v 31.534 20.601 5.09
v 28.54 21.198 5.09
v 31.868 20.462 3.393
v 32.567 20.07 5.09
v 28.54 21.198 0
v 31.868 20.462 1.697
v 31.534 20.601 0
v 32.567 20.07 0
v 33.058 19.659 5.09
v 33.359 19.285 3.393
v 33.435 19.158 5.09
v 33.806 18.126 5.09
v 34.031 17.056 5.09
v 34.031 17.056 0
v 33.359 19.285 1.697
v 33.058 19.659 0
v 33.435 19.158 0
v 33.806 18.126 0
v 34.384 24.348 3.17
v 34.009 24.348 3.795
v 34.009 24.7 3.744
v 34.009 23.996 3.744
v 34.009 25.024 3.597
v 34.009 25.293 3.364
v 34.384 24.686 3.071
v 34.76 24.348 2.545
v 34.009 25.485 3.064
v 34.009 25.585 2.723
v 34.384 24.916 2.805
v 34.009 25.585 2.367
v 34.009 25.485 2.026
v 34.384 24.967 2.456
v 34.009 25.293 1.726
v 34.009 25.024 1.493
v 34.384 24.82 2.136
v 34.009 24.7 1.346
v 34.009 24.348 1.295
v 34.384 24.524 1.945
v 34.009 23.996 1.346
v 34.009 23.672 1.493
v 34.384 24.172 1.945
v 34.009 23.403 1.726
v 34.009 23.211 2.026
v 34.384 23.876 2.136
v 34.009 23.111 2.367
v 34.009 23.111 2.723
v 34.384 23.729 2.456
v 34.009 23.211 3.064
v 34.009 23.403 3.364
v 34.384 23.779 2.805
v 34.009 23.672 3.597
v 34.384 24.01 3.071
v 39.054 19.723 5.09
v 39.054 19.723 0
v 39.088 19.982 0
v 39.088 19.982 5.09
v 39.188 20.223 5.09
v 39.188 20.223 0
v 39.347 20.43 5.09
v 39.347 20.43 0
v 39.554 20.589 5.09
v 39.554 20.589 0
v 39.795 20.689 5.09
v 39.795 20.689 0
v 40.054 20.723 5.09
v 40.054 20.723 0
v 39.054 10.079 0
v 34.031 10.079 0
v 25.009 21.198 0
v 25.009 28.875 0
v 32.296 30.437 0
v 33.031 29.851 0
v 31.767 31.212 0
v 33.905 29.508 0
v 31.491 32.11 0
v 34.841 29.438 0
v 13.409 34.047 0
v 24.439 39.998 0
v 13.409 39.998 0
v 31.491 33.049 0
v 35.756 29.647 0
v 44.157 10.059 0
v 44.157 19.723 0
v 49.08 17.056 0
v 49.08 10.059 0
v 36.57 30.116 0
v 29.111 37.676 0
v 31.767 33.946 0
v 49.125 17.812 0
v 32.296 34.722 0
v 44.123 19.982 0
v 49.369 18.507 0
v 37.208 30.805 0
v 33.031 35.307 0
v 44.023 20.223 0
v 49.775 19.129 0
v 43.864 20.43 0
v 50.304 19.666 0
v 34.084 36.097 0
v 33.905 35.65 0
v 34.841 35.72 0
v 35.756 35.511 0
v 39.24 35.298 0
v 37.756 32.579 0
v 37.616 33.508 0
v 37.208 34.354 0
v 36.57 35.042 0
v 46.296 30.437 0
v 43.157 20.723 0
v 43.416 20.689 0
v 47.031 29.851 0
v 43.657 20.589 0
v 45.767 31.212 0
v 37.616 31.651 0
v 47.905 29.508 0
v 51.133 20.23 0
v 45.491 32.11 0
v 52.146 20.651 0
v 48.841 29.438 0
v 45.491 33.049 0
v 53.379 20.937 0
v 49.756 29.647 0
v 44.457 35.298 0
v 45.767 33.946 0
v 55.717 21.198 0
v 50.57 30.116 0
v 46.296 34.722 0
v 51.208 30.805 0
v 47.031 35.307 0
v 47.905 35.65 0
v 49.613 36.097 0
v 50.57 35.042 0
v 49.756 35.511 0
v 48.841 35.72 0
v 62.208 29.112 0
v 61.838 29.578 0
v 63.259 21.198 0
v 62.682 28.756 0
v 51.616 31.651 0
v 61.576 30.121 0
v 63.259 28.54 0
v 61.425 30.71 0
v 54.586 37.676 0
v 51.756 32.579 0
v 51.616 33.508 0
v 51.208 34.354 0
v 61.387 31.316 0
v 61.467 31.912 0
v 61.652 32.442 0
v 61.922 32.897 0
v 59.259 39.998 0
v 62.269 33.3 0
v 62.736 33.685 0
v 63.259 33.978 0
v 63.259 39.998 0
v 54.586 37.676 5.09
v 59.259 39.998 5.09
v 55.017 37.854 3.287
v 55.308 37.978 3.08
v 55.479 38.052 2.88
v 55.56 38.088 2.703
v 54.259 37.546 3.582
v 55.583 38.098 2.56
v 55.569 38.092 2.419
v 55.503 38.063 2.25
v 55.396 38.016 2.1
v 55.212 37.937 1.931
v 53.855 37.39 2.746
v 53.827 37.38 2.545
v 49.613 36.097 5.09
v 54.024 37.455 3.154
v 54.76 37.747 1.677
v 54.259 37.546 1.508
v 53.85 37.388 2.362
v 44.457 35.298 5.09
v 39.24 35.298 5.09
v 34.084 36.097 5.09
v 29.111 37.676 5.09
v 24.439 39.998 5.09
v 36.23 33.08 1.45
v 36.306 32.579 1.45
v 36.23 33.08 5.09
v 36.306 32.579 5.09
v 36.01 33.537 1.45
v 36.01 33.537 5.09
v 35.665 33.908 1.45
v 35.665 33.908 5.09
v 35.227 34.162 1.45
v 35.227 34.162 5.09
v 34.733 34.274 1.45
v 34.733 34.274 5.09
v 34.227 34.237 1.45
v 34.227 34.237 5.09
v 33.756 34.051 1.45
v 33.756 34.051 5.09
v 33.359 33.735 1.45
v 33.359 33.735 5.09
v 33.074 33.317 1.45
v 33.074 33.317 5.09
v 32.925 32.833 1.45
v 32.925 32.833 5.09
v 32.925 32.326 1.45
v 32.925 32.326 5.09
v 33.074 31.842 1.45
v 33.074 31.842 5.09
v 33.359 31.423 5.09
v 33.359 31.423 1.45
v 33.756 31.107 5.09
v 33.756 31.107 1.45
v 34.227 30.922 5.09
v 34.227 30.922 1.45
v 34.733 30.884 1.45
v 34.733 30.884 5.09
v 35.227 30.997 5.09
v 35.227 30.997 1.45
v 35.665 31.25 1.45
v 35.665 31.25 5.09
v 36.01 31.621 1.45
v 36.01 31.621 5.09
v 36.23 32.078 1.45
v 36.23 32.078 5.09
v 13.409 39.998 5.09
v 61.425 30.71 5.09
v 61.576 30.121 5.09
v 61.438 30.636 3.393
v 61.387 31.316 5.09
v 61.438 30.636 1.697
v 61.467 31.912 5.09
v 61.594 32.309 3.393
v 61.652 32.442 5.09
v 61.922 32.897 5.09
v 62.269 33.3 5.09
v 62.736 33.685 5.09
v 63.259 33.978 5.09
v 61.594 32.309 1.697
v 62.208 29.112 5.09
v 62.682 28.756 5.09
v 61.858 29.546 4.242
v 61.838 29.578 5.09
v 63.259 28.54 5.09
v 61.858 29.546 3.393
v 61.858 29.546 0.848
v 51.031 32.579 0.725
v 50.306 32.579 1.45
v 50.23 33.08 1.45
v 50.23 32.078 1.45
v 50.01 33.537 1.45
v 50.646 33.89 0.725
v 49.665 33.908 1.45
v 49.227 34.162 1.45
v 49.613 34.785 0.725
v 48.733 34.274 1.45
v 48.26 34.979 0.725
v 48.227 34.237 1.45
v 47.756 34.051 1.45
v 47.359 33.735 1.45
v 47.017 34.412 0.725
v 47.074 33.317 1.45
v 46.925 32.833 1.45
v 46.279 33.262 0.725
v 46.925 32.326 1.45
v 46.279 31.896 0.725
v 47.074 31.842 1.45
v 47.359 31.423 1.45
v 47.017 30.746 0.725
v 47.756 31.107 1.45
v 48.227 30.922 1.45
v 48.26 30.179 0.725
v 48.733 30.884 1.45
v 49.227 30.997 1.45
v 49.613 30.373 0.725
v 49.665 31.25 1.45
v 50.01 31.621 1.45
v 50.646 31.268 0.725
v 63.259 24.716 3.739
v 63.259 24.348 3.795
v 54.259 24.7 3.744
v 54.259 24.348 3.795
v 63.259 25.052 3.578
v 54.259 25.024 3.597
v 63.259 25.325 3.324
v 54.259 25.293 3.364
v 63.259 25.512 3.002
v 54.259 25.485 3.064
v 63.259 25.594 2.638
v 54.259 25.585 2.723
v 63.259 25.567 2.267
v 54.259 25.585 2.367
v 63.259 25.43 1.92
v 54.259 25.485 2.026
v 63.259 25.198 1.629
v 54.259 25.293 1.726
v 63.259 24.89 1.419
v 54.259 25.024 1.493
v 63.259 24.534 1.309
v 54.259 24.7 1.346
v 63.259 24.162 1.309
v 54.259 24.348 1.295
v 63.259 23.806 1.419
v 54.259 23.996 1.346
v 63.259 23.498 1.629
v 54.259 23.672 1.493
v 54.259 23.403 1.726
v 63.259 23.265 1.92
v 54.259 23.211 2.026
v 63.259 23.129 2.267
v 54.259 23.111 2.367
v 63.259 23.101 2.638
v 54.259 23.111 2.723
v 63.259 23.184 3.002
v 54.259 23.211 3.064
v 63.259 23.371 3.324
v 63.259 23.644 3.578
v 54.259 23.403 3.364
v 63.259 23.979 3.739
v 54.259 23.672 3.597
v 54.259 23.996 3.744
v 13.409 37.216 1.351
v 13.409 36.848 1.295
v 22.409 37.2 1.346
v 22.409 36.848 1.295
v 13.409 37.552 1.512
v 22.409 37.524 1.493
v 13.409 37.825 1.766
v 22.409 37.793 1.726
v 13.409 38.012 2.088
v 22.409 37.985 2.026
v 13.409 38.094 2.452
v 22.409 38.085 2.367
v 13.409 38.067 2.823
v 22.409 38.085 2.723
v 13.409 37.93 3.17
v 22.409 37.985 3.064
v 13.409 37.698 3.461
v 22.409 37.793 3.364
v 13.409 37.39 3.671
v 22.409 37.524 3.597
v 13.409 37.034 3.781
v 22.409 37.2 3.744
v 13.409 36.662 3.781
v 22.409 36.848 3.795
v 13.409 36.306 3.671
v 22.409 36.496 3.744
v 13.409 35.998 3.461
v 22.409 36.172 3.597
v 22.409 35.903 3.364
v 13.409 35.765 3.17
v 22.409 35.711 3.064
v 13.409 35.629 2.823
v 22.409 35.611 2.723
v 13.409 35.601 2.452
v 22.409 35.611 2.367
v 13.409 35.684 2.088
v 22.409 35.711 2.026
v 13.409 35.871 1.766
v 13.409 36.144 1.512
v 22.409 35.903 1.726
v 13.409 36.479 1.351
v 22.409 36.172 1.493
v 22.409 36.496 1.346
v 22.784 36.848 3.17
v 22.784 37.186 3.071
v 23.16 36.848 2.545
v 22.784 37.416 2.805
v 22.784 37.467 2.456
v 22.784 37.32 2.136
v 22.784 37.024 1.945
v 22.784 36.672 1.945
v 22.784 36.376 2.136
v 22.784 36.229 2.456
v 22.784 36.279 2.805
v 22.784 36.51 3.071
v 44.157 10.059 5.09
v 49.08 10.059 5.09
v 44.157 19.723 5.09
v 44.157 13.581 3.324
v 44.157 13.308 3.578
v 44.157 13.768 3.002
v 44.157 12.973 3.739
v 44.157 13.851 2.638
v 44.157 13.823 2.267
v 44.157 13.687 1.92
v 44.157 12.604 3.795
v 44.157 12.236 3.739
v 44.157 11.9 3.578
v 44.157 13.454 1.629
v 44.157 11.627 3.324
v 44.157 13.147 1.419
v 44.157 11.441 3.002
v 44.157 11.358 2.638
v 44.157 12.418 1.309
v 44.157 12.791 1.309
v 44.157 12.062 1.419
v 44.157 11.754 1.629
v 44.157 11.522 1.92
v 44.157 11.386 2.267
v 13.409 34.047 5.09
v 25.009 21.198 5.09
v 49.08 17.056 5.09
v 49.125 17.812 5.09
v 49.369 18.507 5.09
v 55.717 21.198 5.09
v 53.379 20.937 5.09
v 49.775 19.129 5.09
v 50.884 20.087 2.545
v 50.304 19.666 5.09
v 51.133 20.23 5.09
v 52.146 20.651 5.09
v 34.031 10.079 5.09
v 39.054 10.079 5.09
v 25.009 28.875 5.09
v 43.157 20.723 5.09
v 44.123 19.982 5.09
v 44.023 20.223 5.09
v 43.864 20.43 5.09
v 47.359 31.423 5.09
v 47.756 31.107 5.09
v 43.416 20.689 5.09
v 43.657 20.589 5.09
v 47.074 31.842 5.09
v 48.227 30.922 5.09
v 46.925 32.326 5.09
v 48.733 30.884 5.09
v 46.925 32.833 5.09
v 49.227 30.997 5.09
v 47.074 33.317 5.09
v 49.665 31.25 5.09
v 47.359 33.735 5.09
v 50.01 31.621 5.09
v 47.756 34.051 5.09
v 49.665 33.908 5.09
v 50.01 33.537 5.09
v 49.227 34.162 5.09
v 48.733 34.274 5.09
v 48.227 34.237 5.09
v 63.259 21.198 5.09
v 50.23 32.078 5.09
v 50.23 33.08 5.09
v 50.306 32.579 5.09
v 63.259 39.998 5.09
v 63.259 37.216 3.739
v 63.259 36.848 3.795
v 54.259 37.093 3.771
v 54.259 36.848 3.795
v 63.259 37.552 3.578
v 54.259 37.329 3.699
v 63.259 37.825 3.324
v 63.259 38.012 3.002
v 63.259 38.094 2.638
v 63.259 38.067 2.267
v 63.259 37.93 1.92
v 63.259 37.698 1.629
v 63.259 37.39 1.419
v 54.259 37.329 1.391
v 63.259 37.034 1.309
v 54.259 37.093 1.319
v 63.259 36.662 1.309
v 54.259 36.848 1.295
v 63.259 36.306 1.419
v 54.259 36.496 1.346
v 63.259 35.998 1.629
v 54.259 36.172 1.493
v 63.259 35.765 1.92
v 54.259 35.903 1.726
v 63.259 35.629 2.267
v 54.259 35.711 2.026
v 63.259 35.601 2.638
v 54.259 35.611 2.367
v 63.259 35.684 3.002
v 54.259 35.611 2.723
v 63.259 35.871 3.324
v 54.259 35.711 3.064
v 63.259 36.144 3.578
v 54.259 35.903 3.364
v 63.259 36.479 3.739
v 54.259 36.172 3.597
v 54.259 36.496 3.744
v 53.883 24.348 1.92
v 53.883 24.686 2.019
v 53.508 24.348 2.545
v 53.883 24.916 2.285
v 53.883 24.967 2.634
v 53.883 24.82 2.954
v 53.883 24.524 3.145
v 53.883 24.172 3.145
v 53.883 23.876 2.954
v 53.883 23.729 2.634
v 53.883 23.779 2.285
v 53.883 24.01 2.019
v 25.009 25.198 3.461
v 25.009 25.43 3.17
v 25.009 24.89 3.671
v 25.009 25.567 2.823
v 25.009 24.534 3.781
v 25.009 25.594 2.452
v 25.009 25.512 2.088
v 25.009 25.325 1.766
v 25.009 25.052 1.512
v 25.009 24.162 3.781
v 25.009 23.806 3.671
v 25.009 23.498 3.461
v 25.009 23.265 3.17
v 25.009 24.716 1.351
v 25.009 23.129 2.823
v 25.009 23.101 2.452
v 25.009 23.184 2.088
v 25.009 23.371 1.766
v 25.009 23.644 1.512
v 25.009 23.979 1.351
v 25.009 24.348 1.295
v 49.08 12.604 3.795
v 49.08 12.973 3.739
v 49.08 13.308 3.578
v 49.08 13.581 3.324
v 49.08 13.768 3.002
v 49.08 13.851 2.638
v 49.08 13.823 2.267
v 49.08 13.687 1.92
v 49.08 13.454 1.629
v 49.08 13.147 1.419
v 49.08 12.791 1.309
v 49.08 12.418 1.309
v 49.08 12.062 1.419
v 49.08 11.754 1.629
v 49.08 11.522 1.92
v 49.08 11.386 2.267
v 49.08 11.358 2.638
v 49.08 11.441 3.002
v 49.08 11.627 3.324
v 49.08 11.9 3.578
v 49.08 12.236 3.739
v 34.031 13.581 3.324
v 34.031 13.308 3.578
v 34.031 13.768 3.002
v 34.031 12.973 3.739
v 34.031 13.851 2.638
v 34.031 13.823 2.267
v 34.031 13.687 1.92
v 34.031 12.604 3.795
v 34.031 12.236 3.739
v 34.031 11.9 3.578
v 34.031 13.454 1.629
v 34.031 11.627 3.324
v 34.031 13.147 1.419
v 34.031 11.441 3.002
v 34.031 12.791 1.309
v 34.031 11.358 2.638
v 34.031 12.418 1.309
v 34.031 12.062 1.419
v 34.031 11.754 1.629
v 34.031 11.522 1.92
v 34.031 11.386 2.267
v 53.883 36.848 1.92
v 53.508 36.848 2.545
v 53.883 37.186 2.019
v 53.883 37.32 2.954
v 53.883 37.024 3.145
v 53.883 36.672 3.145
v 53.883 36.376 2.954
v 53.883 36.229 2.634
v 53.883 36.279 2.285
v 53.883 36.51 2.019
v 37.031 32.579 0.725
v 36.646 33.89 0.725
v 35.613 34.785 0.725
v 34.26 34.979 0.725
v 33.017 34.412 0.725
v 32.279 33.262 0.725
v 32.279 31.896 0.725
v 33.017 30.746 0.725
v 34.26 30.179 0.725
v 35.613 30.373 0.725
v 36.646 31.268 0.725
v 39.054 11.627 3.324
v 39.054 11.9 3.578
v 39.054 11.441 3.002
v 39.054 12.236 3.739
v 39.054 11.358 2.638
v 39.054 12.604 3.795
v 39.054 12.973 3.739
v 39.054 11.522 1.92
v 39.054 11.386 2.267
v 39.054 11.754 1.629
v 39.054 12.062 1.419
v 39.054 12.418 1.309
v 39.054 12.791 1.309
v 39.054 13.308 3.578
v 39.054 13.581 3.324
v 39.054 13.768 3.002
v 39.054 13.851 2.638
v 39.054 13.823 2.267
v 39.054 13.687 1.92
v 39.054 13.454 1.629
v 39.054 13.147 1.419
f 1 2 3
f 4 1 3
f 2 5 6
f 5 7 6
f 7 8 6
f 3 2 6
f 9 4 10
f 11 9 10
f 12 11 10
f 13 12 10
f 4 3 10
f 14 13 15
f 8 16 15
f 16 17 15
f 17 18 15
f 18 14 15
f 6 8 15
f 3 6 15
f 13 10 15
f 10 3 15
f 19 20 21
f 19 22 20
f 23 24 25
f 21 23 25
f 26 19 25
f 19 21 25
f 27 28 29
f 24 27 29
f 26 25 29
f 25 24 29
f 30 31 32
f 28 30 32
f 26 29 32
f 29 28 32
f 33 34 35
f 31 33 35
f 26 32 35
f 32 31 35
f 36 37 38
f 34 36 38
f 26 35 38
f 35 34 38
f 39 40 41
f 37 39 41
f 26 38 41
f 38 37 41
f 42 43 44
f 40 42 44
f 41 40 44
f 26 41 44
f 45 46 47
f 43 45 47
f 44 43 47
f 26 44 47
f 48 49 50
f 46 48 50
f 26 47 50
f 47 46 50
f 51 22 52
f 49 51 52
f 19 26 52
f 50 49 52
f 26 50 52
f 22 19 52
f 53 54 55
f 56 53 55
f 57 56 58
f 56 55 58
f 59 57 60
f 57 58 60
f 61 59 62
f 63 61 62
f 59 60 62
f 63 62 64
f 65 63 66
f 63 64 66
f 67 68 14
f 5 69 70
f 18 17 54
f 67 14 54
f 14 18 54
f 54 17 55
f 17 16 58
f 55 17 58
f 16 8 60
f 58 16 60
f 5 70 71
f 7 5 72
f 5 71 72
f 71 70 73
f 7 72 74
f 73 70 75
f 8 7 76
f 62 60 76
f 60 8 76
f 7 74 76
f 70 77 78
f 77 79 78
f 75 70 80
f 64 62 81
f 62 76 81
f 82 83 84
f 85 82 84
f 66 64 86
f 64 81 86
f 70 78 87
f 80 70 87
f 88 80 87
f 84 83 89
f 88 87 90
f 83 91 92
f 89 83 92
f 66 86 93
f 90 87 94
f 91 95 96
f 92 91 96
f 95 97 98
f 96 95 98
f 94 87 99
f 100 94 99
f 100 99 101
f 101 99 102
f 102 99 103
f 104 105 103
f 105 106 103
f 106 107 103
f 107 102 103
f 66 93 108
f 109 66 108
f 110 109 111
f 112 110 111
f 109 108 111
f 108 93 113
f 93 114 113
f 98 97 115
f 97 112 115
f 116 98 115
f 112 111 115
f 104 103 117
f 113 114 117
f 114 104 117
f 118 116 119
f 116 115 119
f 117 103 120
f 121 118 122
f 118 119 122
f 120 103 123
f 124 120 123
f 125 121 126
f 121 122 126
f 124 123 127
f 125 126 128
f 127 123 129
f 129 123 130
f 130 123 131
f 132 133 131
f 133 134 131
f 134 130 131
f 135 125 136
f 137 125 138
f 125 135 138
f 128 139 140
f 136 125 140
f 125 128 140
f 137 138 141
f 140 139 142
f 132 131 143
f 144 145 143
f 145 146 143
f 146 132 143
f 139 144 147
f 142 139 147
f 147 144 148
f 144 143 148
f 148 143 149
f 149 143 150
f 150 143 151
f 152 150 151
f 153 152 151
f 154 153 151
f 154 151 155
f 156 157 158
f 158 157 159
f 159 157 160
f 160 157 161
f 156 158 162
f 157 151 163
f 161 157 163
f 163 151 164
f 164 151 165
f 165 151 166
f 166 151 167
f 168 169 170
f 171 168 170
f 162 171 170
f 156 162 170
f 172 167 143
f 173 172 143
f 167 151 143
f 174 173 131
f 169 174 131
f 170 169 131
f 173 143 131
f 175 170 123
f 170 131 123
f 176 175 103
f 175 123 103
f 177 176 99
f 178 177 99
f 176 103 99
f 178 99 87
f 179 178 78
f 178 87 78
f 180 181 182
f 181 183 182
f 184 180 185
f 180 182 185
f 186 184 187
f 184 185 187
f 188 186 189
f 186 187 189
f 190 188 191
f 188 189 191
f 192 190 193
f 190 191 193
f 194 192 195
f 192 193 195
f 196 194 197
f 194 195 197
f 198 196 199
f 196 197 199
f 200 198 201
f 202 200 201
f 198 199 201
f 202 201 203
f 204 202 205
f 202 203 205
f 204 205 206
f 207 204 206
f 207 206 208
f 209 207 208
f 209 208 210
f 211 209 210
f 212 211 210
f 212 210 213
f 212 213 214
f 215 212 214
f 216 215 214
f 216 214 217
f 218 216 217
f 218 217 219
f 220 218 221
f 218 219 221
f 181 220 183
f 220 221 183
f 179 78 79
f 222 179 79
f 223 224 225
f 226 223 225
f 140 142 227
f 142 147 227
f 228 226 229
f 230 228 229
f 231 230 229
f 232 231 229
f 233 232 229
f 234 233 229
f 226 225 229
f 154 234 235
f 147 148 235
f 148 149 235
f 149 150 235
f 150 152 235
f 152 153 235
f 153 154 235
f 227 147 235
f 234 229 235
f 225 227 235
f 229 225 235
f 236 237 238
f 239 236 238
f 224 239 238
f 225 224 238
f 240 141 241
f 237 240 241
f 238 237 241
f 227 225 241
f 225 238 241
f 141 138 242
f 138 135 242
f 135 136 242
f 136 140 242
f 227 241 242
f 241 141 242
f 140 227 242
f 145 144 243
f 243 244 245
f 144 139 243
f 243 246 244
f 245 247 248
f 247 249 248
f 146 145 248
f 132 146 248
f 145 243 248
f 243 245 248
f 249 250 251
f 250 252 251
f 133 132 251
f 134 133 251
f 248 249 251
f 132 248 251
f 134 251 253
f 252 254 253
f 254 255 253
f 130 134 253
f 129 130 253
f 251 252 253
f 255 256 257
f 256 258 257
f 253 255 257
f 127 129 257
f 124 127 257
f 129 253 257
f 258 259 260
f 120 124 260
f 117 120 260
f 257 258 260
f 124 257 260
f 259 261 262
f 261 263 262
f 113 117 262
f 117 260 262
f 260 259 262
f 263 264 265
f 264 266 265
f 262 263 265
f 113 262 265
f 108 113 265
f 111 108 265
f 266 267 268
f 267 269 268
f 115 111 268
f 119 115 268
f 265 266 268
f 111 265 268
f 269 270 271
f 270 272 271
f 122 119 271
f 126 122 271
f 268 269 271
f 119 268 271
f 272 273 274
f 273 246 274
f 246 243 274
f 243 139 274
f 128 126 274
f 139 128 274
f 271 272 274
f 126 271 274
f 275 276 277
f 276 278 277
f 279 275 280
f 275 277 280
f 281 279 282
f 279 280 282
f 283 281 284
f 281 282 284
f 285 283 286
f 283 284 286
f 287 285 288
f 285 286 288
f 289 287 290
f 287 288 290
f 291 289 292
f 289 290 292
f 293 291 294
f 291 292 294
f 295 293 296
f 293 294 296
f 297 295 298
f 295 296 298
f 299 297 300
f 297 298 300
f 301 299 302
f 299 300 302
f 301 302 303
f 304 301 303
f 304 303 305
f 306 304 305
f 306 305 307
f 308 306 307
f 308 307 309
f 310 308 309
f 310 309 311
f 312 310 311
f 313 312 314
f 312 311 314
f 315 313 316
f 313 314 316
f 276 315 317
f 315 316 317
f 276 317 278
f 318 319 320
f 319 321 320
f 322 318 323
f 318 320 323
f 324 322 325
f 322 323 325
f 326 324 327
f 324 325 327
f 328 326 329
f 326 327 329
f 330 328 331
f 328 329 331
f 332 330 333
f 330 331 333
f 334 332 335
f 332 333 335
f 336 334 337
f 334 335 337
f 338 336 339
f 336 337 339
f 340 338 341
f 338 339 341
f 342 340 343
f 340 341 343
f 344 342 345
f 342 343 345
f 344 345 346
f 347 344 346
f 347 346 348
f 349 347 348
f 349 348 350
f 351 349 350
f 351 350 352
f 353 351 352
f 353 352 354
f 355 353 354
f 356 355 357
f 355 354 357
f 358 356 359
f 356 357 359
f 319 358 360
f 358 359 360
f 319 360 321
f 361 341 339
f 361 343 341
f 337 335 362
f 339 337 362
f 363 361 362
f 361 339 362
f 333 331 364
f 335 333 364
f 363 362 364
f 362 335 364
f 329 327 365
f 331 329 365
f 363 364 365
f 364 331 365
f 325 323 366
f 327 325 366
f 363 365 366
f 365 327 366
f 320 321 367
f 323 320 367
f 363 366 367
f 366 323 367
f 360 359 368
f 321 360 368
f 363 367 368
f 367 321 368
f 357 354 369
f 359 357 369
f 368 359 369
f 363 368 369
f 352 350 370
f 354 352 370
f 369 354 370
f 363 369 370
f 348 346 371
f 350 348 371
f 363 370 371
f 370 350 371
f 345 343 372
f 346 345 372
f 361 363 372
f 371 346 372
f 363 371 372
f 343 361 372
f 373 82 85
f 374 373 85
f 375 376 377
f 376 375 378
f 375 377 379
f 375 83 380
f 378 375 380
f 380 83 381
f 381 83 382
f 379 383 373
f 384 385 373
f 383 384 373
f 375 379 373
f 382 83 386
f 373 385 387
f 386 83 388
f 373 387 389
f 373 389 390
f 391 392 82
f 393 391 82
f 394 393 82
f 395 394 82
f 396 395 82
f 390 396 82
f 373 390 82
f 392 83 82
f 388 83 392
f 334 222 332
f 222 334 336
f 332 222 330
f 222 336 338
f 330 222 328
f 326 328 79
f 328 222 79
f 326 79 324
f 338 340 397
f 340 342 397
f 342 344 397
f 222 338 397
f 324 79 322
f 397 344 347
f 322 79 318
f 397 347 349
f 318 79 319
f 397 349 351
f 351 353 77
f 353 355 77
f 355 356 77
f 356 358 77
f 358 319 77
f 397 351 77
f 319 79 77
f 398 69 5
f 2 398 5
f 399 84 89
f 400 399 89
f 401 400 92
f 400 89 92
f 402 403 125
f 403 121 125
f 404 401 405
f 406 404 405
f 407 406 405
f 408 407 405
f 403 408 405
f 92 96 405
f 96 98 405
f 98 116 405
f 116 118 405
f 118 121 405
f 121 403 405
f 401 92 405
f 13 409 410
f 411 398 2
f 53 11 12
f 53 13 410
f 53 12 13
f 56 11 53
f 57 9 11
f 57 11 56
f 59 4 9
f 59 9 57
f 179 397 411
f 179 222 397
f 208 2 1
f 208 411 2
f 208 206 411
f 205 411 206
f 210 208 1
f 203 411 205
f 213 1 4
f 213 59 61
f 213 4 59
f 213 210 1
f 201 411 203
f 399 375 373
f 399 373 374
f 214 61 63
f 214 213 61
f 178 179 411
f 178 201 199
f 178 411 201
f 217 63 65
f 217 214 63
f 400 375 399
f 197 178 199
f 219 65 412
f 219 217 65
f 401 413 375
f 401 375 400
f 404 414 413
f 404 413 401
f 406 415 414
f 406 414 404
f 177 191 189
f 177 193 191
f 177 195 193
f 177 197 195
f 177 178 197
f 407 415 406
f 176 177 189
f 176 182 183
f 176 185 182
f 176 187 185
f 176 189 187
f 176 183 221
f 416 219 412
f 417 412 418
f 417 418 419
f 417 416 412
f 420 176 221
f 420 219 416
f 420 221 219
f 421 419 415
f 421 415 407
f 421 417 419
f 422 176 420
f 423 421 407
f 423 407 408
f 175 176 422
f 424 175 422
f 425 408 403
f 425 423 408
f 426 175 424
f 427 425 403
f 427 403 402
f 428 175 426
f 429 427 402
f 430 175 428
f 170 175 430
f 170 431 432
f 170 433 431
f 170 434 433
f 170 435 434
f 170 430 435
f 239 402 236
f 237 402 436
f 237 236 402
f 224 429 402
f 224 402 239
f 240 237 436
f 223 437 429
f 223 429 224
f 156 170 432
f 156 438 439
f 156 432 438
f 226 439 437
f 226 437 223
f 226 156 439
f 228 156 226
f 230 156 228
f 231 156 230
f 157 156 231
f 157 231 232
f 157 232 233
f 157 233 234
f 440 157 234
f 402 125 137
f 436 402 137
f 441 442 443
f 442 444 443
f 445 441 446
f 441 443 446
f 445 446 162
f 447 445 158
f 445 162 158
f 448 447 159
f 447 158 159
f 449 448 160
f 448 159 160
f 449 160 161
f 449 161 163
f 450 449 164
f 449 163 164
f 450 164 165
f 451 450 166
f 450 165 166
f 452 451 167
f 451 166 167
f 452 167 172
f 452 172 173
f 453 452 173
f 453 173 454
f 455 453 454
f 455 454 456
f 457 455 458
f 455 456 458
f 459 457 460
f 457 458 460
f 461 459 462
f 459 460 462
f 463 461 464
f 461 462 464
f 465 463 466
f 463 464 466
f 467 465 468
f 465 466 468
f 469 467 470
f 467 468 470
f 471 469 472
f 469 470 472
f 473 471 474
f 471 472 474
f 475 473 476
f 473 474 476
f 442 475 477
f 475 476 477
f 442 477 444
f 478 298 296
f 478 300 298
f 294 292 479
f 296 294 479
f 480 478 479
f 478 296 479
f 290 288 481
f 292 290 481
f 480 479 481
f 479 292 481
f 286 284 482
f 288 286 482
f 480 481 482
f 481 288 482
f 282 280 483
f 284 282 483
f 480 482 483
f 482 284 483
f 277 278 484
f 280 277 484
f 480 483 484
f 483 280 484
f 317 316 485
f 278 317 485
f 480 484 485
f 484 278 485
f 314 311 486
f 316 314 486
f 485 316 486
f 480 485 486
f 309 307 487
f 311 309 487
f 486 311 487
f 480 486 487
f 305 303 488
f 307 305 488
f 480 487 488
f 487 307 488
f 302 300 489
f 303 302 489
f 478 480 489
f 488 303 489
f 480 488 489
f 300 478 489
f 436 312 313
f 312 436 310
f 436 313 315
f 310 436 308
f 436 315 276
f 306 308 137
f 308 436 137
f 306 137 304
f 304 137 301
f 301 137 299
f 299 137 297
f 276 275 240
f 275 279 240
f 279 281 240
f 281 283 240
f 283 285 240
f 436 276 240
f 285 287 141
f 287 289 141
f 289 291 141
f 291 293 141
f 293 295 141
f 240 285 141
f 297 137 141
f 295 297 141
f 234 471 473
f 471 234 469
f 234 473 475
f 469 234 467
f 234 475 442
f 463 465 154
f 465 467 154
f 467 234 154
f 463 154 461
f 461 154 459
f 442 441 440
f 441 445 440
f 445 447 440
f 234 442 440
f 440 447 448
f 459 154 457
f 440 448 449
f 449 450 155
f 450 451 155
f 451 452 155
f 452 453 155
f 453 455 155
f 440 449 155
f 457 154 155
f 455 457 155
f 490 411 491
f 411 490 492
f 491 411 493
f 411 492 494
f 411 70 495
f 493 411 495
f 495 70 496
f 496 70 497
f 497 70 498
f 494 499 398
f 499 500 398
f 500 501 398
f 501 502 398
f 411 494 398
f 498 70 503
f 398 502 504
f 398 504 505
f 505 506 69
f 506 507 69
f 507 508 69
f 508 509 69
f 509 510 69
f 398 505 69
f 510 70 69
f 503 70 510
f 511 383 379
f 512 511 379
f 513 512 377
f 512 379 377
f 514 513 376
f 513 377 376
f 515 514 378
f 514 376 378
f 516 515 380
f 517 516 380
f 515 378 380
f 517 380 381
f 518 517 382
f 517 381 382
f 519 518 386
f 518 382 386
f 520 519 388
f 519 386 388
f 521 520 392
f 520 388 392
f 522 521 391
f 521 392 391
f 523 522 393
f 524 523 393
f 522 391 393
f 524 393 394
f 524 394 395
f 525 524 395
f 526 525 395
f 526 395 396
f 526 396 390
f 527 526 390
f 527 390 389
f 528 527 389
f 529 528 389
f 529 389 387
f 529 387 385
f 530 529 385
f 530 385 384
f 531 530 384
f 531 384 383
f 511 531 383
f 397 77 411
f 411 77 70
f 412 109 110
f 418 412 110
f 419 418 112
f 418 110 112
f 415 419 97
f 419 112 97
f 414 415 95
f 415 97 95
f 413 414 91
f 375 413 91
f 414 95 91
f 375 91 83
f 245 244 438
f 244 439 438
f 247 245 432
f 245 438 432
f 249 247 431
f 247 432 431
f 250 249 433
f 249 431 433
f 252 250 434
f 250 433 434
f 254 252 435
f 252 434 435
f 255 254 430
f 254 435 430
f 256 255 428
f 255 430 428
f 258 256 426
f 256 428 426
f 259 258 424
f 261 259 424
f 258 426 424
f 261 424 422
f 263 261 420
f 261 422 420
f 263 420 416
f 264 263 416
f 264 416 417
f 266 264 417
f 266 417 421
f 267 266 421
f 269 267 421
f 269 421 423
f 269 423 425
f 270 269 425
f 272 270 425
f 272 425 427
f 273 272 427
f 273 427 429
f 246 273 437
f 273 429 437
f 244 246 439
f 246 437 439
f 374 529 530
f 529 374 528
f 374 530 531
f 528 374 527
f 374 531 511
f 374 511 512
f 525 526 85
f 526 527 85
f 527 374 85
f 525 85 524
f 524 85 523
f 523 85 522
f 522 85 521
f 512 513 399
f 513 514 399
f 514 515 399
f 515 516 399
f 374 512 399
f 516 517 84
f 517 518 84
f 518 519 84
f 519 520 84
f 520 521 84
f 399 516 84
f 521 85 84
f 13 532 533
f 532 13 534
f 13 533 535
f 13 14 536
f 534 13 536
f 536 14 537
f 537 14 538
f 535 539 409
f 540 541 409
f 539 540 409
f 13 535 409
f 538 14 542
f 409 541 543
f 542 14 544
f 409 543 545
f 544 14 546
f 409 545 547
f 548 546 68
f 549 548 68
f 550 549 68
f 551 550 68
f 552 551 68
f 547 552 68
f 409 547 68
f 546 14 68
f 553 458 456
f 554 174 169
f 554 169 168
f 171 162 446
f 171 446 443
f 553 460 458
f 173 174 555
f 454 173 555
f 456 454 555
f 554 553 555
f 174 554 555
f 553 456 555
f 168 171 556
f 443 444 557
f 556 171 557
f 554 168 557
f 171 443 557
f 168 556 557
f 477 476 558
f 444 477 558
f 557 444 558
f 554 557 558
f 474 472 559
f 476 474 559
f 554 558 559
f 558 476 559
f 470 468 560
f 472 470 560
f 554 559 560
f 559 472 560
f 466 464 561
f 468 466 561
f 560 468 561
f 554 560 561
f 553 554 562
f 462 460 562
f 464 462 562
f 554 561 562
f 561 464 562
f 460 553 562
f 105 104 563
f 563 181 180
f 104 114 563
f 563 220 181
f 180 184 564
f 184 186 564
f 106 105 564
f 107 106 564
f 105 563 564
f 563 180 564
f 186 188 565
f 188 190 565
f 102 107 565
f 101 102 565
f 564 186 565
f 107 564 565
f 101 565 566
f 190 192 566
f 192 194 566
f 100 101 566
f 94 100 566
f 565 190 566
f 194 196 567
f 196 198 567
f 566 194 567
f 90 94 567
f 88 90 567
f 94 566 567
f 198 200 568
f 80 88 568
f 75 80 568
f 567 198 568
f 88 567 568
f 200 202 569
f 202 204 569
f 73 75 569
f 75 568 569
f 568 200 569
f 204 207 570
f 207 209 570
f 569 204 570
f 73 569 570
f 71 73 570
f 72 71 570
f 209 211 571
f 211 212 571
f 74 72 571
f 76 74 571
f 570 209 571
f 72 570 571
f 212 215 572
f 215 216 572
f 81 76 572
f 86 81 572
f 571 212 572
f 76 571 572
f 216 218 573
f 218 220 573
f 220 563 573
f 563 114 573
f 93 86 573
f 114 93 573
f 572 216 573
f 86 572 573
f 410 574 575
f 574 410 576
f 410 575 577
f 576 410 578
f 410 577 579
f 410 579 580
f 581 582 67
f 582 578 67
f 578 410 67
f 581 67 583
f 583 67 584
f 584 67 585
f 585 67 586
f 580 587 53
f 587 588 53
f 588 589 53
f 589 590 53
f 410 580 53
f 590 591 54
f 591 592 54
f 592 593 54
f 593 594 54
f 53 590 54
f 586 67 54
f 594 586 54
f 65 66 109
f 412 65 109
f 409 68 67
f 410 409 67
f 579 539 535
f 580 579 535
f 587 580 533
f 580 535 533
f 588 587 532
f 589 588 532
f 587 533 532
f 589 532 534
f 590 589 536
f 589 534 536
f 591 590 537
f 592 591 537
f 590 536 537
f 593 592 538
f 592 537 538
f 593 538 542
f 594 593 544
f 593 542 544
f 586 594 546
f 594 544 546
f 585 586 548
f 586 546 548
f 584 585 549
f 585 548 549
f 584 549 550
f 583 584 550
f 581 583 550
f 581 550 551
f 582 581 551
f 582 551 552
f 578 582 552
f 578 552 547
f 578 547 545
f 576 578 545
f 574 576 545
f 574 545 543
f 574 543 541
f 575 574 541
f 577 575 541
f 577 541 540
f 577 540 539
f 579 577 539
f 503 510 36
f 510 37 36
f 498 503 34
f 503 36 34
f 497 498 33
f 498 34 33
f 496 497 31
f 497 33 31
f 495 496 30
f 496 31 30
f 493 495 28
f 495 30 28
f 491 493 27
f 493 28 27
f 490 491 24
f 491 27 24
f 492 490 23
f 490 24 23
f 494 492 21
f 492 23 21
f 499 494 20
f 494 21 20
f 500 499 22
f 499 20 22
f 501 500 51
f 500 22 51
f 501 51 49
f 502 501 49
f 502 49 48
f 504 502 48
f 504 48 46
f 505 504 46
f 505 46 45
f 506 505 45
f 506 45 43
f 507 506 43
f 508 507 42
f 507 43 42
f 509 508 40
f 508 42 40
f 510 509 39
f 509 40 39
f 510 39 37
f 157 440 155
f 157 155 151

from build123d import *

# Parameters (mm, degrees)
ESTRUSIONE_ESTRUSIONE1_DEPTH           = 5.09
FORO_SVASATO_PER_VITE_M3_1_D           = 3.4
FORO_SVASATO_PER_VITE_M3_1_CSINK_D     = 6.3
FORO_SVASATO_PER_VITE_M3_1_CSINK_ANGLE = 90
FORO_FILETTATO_M3X0_5_1_D              = 2.5
FORO_FILETTATO_M3X0_5_1_DEPTH          = 9
FORO_FILETTATO_M3X0_5_1_TIP            = 0.751075774
FORO_FILETTATO_M3X0_5_2_D              = 2.5
FORO_FILETTATO_M3X0_5_2_DEPTH          = 9
FORO_FILETTATO_M3X0_5_2_TIP            = 0.751075774
FORO_FILETTATO_M3X0_5_3_D              = 2.5
FORO_FILETTATO_M3X0_5_3_DEPTH          = 9
FORO_FILETTATO_M3X0_5_3_TIP            = 0.751075774
FORO_FILETTATO_M3X0_5_4_D              = 2.5


with BuildPart() as part:
    # Schizzo2 → Estrusione-Estrusione1 (new body)
    with BuildSketch(Plane.XY):
        with BuildLine():
            Line((13.408661509, 34.046761388), (25.008661509, 28.874777457))
            Line((25.008661509, 28.874777457), (25.008661509, 21.197917302))
            Line((25.008661509, 21.197917302), (28.539563234, 21.197917302))
            add(Edge.make_bspline(
                [(28.539563234, 21.197917302), (29.672665245, 21.054672347), (31.442336464, 20.883728728), (33.709967859, 19.337881701), (33.860174007, 17.780017142), (34.031169837, 17.055524547)],
                knots=[0, 0, 0, 0, 0.44666859, 0.69482561, 1, 1, 1, 1], degree=3))
            Line((34.031169837, 17.055524547), (34.031169837, 10.079137282))
            Line((34.031169837, 10.079137282), (39.054168668, 10.079137282))
            Line((39.054168668, 10.079137282), (39.054168668, 19.723110995))
            ThreePointArc((39.054168668, 19.723110995), (39.347061887, 20.430217776), (40.054168668, 20.723110995))
            Line((40.054168668, 20.723110995), (43.156897639, 20.723110995))
            ThreePointArc((43.156897639, 20.723110995), (43.86400442, 20.430217776), (44.156897639, 19.723110995))
            Line((44.156897639, 19.723110995), (44.156897639, 10.059204747))
            Line((44.156897639, 10.059204747), (49.080233794, 10.059204747))
            Line((49.080233794, 10.059204747), (49.080233794, 17.055524547))
            add(Edge.make_bspline(
                [(49.080233794, 17.055524547), (48.967324691, 18.346340588), (50.999627836, 20.921028345), (54.113128084, 21.035559742), (55.71736734, 21.197917302)],
                knots=[0, 0, 0, 0, 0.423714054, 1, 1, 1, 1], degree=3))
            Line((55.71736734, 21.197917302), (63.258661509, 21.197917302))
            Line((63.258661509, 21.197917302), (63.258661509, 28.539967348))
            add(Edge.make_bspline(
                [(63.258661509, 28.539967348), (62.239722551, 28.759416988), (61.253896648, 30.182238688), (61.448846017, 32.629580504), (62.536492347, 33.654111413), (63.258661509, 33.978194592)],
                knots=[0, 0, 0, 0, 0.415878439, 0.65656192, 1, 1, 1, 1], degree=3))
            Line((63.258661509, 33.978194592), (63.258661509, 39.997917302))
            Line((63.258661509, 39.997917302), (59.258661509, 39.997917302))
            ThreePointArc((59.258661509, 39.997917302), (41.848661509, 35.197917302), (24.438661509, 39.997917302))
            Line((24.438661509, 39.997917302), (13.408661509, 39.997917302))
            Line((13.408661509, 39.997917302), (13.408661509, 34.046761388))
        make_face()
    extrude(amount=ESTRUSIONE_ESTRUSIONE1_DEPTH)

    # Foro svasato per Vite M3-1 (through all)
    with Locations(Plane(origin=(0, 0, 0), x_dir=(-1, 0, 0), z_dir=(0, 0, -1))):
        with Locations((-48.605533153, 32.579137282), (-34.605533153, 32.579137282)):
            CounterSinkHole(FORO_SVASATO_PER_VITE_M3_1_D / 2, FORO_SVASATO_PER_VITE_M3_1_CSINK_D / 2, counter_sink_angle=FORO_SVASATO_PER_VITE_M3_1_CSINK_ANGLE)

    # Foro filettato M3x0.5-1
    with Locations(Plane(origin=(63.258661509, 0, 0), x_dir=(0, 0, -1), z_dir=(1, 0, 0))):
        with Locations((-2.545, 36.847917302), (-2.545, 24.347917302)):
            Hole(FORO_FILETTATO_M3X0_5_1_D / 2, depth=FORO_FILETTATO_M3X0_5_1_DEPTH)
            with Locations((0, 0, -(FORO_FILETTATO_M3X0_5_1_DEPTH + FORO_FILETTATO_M3X0_5_1_TIP / 2))):  # 118° drill point
                Cone(0, FORO_FILETTATO_M3X0_5_1_D / 2, FORO_FILETTATO_M3X0_5_1_TIP, mode=Mode.SUBTRACT)

    # Foro filettato M3x0.5-2
    with Locations(Plane.ZY.offset(-13.408661509)):
        with Locations((2.545, 36.847917302)):
            Hole(FORO_FILETTATO_M3X0_5_2_D / 2, depth=FORO_FILETTATO_M3X0_5_2_DEPTH)
            with Locations((0, 0, -(FORO_FILETTATO_M3X0_5_2_DEPTH + FORO_FILETTATO_M3X0_5_2_TIP / 2))):  # 118° drill point
                Cone(0, FORO_FILETTATO_M3X0_5_2_D / 2, FORO_FILETTATO_M3X0_5_2_TIP, mode=Mode.SUBTRACT)

    # Foro filettato M3x0.5-3
    with Locations(Plane.ZY.offset(-25.008661509)):
        with Locations((2.545, 24.347917302)):
            Hole(FORO_FILETTATO_M3X0_5_3_D / 2, depth=FORO_FILETTATO_M3X0_5_3_DEPTH)
            with Locations((0, 0, -(FORO_FILETTATO_M3X0_5_3_DEPTH + FORO_FILETTATO_M3X0_5_3_TIP / 2))):  # 118° drill point
                Cone(0, FORO_FILETTATO_M3X0_5_3_D / 2, FORO_FILETTATO_M3X0_5_3_TIP, mode=Mode.SUBTRACT)

    # Foro filettato M3x0.5-4 (through all)
    with Locations(Plane(origin=(49.080233794, 0, 0), x_dir=(0, 0, -1), z_dir=(1, 0, 0))):
        with Locations((-2.545, 12.604204747)):
            Hole(FORO_FILETTATO_M3X0_5_4_D / 2)


solid = part.part
